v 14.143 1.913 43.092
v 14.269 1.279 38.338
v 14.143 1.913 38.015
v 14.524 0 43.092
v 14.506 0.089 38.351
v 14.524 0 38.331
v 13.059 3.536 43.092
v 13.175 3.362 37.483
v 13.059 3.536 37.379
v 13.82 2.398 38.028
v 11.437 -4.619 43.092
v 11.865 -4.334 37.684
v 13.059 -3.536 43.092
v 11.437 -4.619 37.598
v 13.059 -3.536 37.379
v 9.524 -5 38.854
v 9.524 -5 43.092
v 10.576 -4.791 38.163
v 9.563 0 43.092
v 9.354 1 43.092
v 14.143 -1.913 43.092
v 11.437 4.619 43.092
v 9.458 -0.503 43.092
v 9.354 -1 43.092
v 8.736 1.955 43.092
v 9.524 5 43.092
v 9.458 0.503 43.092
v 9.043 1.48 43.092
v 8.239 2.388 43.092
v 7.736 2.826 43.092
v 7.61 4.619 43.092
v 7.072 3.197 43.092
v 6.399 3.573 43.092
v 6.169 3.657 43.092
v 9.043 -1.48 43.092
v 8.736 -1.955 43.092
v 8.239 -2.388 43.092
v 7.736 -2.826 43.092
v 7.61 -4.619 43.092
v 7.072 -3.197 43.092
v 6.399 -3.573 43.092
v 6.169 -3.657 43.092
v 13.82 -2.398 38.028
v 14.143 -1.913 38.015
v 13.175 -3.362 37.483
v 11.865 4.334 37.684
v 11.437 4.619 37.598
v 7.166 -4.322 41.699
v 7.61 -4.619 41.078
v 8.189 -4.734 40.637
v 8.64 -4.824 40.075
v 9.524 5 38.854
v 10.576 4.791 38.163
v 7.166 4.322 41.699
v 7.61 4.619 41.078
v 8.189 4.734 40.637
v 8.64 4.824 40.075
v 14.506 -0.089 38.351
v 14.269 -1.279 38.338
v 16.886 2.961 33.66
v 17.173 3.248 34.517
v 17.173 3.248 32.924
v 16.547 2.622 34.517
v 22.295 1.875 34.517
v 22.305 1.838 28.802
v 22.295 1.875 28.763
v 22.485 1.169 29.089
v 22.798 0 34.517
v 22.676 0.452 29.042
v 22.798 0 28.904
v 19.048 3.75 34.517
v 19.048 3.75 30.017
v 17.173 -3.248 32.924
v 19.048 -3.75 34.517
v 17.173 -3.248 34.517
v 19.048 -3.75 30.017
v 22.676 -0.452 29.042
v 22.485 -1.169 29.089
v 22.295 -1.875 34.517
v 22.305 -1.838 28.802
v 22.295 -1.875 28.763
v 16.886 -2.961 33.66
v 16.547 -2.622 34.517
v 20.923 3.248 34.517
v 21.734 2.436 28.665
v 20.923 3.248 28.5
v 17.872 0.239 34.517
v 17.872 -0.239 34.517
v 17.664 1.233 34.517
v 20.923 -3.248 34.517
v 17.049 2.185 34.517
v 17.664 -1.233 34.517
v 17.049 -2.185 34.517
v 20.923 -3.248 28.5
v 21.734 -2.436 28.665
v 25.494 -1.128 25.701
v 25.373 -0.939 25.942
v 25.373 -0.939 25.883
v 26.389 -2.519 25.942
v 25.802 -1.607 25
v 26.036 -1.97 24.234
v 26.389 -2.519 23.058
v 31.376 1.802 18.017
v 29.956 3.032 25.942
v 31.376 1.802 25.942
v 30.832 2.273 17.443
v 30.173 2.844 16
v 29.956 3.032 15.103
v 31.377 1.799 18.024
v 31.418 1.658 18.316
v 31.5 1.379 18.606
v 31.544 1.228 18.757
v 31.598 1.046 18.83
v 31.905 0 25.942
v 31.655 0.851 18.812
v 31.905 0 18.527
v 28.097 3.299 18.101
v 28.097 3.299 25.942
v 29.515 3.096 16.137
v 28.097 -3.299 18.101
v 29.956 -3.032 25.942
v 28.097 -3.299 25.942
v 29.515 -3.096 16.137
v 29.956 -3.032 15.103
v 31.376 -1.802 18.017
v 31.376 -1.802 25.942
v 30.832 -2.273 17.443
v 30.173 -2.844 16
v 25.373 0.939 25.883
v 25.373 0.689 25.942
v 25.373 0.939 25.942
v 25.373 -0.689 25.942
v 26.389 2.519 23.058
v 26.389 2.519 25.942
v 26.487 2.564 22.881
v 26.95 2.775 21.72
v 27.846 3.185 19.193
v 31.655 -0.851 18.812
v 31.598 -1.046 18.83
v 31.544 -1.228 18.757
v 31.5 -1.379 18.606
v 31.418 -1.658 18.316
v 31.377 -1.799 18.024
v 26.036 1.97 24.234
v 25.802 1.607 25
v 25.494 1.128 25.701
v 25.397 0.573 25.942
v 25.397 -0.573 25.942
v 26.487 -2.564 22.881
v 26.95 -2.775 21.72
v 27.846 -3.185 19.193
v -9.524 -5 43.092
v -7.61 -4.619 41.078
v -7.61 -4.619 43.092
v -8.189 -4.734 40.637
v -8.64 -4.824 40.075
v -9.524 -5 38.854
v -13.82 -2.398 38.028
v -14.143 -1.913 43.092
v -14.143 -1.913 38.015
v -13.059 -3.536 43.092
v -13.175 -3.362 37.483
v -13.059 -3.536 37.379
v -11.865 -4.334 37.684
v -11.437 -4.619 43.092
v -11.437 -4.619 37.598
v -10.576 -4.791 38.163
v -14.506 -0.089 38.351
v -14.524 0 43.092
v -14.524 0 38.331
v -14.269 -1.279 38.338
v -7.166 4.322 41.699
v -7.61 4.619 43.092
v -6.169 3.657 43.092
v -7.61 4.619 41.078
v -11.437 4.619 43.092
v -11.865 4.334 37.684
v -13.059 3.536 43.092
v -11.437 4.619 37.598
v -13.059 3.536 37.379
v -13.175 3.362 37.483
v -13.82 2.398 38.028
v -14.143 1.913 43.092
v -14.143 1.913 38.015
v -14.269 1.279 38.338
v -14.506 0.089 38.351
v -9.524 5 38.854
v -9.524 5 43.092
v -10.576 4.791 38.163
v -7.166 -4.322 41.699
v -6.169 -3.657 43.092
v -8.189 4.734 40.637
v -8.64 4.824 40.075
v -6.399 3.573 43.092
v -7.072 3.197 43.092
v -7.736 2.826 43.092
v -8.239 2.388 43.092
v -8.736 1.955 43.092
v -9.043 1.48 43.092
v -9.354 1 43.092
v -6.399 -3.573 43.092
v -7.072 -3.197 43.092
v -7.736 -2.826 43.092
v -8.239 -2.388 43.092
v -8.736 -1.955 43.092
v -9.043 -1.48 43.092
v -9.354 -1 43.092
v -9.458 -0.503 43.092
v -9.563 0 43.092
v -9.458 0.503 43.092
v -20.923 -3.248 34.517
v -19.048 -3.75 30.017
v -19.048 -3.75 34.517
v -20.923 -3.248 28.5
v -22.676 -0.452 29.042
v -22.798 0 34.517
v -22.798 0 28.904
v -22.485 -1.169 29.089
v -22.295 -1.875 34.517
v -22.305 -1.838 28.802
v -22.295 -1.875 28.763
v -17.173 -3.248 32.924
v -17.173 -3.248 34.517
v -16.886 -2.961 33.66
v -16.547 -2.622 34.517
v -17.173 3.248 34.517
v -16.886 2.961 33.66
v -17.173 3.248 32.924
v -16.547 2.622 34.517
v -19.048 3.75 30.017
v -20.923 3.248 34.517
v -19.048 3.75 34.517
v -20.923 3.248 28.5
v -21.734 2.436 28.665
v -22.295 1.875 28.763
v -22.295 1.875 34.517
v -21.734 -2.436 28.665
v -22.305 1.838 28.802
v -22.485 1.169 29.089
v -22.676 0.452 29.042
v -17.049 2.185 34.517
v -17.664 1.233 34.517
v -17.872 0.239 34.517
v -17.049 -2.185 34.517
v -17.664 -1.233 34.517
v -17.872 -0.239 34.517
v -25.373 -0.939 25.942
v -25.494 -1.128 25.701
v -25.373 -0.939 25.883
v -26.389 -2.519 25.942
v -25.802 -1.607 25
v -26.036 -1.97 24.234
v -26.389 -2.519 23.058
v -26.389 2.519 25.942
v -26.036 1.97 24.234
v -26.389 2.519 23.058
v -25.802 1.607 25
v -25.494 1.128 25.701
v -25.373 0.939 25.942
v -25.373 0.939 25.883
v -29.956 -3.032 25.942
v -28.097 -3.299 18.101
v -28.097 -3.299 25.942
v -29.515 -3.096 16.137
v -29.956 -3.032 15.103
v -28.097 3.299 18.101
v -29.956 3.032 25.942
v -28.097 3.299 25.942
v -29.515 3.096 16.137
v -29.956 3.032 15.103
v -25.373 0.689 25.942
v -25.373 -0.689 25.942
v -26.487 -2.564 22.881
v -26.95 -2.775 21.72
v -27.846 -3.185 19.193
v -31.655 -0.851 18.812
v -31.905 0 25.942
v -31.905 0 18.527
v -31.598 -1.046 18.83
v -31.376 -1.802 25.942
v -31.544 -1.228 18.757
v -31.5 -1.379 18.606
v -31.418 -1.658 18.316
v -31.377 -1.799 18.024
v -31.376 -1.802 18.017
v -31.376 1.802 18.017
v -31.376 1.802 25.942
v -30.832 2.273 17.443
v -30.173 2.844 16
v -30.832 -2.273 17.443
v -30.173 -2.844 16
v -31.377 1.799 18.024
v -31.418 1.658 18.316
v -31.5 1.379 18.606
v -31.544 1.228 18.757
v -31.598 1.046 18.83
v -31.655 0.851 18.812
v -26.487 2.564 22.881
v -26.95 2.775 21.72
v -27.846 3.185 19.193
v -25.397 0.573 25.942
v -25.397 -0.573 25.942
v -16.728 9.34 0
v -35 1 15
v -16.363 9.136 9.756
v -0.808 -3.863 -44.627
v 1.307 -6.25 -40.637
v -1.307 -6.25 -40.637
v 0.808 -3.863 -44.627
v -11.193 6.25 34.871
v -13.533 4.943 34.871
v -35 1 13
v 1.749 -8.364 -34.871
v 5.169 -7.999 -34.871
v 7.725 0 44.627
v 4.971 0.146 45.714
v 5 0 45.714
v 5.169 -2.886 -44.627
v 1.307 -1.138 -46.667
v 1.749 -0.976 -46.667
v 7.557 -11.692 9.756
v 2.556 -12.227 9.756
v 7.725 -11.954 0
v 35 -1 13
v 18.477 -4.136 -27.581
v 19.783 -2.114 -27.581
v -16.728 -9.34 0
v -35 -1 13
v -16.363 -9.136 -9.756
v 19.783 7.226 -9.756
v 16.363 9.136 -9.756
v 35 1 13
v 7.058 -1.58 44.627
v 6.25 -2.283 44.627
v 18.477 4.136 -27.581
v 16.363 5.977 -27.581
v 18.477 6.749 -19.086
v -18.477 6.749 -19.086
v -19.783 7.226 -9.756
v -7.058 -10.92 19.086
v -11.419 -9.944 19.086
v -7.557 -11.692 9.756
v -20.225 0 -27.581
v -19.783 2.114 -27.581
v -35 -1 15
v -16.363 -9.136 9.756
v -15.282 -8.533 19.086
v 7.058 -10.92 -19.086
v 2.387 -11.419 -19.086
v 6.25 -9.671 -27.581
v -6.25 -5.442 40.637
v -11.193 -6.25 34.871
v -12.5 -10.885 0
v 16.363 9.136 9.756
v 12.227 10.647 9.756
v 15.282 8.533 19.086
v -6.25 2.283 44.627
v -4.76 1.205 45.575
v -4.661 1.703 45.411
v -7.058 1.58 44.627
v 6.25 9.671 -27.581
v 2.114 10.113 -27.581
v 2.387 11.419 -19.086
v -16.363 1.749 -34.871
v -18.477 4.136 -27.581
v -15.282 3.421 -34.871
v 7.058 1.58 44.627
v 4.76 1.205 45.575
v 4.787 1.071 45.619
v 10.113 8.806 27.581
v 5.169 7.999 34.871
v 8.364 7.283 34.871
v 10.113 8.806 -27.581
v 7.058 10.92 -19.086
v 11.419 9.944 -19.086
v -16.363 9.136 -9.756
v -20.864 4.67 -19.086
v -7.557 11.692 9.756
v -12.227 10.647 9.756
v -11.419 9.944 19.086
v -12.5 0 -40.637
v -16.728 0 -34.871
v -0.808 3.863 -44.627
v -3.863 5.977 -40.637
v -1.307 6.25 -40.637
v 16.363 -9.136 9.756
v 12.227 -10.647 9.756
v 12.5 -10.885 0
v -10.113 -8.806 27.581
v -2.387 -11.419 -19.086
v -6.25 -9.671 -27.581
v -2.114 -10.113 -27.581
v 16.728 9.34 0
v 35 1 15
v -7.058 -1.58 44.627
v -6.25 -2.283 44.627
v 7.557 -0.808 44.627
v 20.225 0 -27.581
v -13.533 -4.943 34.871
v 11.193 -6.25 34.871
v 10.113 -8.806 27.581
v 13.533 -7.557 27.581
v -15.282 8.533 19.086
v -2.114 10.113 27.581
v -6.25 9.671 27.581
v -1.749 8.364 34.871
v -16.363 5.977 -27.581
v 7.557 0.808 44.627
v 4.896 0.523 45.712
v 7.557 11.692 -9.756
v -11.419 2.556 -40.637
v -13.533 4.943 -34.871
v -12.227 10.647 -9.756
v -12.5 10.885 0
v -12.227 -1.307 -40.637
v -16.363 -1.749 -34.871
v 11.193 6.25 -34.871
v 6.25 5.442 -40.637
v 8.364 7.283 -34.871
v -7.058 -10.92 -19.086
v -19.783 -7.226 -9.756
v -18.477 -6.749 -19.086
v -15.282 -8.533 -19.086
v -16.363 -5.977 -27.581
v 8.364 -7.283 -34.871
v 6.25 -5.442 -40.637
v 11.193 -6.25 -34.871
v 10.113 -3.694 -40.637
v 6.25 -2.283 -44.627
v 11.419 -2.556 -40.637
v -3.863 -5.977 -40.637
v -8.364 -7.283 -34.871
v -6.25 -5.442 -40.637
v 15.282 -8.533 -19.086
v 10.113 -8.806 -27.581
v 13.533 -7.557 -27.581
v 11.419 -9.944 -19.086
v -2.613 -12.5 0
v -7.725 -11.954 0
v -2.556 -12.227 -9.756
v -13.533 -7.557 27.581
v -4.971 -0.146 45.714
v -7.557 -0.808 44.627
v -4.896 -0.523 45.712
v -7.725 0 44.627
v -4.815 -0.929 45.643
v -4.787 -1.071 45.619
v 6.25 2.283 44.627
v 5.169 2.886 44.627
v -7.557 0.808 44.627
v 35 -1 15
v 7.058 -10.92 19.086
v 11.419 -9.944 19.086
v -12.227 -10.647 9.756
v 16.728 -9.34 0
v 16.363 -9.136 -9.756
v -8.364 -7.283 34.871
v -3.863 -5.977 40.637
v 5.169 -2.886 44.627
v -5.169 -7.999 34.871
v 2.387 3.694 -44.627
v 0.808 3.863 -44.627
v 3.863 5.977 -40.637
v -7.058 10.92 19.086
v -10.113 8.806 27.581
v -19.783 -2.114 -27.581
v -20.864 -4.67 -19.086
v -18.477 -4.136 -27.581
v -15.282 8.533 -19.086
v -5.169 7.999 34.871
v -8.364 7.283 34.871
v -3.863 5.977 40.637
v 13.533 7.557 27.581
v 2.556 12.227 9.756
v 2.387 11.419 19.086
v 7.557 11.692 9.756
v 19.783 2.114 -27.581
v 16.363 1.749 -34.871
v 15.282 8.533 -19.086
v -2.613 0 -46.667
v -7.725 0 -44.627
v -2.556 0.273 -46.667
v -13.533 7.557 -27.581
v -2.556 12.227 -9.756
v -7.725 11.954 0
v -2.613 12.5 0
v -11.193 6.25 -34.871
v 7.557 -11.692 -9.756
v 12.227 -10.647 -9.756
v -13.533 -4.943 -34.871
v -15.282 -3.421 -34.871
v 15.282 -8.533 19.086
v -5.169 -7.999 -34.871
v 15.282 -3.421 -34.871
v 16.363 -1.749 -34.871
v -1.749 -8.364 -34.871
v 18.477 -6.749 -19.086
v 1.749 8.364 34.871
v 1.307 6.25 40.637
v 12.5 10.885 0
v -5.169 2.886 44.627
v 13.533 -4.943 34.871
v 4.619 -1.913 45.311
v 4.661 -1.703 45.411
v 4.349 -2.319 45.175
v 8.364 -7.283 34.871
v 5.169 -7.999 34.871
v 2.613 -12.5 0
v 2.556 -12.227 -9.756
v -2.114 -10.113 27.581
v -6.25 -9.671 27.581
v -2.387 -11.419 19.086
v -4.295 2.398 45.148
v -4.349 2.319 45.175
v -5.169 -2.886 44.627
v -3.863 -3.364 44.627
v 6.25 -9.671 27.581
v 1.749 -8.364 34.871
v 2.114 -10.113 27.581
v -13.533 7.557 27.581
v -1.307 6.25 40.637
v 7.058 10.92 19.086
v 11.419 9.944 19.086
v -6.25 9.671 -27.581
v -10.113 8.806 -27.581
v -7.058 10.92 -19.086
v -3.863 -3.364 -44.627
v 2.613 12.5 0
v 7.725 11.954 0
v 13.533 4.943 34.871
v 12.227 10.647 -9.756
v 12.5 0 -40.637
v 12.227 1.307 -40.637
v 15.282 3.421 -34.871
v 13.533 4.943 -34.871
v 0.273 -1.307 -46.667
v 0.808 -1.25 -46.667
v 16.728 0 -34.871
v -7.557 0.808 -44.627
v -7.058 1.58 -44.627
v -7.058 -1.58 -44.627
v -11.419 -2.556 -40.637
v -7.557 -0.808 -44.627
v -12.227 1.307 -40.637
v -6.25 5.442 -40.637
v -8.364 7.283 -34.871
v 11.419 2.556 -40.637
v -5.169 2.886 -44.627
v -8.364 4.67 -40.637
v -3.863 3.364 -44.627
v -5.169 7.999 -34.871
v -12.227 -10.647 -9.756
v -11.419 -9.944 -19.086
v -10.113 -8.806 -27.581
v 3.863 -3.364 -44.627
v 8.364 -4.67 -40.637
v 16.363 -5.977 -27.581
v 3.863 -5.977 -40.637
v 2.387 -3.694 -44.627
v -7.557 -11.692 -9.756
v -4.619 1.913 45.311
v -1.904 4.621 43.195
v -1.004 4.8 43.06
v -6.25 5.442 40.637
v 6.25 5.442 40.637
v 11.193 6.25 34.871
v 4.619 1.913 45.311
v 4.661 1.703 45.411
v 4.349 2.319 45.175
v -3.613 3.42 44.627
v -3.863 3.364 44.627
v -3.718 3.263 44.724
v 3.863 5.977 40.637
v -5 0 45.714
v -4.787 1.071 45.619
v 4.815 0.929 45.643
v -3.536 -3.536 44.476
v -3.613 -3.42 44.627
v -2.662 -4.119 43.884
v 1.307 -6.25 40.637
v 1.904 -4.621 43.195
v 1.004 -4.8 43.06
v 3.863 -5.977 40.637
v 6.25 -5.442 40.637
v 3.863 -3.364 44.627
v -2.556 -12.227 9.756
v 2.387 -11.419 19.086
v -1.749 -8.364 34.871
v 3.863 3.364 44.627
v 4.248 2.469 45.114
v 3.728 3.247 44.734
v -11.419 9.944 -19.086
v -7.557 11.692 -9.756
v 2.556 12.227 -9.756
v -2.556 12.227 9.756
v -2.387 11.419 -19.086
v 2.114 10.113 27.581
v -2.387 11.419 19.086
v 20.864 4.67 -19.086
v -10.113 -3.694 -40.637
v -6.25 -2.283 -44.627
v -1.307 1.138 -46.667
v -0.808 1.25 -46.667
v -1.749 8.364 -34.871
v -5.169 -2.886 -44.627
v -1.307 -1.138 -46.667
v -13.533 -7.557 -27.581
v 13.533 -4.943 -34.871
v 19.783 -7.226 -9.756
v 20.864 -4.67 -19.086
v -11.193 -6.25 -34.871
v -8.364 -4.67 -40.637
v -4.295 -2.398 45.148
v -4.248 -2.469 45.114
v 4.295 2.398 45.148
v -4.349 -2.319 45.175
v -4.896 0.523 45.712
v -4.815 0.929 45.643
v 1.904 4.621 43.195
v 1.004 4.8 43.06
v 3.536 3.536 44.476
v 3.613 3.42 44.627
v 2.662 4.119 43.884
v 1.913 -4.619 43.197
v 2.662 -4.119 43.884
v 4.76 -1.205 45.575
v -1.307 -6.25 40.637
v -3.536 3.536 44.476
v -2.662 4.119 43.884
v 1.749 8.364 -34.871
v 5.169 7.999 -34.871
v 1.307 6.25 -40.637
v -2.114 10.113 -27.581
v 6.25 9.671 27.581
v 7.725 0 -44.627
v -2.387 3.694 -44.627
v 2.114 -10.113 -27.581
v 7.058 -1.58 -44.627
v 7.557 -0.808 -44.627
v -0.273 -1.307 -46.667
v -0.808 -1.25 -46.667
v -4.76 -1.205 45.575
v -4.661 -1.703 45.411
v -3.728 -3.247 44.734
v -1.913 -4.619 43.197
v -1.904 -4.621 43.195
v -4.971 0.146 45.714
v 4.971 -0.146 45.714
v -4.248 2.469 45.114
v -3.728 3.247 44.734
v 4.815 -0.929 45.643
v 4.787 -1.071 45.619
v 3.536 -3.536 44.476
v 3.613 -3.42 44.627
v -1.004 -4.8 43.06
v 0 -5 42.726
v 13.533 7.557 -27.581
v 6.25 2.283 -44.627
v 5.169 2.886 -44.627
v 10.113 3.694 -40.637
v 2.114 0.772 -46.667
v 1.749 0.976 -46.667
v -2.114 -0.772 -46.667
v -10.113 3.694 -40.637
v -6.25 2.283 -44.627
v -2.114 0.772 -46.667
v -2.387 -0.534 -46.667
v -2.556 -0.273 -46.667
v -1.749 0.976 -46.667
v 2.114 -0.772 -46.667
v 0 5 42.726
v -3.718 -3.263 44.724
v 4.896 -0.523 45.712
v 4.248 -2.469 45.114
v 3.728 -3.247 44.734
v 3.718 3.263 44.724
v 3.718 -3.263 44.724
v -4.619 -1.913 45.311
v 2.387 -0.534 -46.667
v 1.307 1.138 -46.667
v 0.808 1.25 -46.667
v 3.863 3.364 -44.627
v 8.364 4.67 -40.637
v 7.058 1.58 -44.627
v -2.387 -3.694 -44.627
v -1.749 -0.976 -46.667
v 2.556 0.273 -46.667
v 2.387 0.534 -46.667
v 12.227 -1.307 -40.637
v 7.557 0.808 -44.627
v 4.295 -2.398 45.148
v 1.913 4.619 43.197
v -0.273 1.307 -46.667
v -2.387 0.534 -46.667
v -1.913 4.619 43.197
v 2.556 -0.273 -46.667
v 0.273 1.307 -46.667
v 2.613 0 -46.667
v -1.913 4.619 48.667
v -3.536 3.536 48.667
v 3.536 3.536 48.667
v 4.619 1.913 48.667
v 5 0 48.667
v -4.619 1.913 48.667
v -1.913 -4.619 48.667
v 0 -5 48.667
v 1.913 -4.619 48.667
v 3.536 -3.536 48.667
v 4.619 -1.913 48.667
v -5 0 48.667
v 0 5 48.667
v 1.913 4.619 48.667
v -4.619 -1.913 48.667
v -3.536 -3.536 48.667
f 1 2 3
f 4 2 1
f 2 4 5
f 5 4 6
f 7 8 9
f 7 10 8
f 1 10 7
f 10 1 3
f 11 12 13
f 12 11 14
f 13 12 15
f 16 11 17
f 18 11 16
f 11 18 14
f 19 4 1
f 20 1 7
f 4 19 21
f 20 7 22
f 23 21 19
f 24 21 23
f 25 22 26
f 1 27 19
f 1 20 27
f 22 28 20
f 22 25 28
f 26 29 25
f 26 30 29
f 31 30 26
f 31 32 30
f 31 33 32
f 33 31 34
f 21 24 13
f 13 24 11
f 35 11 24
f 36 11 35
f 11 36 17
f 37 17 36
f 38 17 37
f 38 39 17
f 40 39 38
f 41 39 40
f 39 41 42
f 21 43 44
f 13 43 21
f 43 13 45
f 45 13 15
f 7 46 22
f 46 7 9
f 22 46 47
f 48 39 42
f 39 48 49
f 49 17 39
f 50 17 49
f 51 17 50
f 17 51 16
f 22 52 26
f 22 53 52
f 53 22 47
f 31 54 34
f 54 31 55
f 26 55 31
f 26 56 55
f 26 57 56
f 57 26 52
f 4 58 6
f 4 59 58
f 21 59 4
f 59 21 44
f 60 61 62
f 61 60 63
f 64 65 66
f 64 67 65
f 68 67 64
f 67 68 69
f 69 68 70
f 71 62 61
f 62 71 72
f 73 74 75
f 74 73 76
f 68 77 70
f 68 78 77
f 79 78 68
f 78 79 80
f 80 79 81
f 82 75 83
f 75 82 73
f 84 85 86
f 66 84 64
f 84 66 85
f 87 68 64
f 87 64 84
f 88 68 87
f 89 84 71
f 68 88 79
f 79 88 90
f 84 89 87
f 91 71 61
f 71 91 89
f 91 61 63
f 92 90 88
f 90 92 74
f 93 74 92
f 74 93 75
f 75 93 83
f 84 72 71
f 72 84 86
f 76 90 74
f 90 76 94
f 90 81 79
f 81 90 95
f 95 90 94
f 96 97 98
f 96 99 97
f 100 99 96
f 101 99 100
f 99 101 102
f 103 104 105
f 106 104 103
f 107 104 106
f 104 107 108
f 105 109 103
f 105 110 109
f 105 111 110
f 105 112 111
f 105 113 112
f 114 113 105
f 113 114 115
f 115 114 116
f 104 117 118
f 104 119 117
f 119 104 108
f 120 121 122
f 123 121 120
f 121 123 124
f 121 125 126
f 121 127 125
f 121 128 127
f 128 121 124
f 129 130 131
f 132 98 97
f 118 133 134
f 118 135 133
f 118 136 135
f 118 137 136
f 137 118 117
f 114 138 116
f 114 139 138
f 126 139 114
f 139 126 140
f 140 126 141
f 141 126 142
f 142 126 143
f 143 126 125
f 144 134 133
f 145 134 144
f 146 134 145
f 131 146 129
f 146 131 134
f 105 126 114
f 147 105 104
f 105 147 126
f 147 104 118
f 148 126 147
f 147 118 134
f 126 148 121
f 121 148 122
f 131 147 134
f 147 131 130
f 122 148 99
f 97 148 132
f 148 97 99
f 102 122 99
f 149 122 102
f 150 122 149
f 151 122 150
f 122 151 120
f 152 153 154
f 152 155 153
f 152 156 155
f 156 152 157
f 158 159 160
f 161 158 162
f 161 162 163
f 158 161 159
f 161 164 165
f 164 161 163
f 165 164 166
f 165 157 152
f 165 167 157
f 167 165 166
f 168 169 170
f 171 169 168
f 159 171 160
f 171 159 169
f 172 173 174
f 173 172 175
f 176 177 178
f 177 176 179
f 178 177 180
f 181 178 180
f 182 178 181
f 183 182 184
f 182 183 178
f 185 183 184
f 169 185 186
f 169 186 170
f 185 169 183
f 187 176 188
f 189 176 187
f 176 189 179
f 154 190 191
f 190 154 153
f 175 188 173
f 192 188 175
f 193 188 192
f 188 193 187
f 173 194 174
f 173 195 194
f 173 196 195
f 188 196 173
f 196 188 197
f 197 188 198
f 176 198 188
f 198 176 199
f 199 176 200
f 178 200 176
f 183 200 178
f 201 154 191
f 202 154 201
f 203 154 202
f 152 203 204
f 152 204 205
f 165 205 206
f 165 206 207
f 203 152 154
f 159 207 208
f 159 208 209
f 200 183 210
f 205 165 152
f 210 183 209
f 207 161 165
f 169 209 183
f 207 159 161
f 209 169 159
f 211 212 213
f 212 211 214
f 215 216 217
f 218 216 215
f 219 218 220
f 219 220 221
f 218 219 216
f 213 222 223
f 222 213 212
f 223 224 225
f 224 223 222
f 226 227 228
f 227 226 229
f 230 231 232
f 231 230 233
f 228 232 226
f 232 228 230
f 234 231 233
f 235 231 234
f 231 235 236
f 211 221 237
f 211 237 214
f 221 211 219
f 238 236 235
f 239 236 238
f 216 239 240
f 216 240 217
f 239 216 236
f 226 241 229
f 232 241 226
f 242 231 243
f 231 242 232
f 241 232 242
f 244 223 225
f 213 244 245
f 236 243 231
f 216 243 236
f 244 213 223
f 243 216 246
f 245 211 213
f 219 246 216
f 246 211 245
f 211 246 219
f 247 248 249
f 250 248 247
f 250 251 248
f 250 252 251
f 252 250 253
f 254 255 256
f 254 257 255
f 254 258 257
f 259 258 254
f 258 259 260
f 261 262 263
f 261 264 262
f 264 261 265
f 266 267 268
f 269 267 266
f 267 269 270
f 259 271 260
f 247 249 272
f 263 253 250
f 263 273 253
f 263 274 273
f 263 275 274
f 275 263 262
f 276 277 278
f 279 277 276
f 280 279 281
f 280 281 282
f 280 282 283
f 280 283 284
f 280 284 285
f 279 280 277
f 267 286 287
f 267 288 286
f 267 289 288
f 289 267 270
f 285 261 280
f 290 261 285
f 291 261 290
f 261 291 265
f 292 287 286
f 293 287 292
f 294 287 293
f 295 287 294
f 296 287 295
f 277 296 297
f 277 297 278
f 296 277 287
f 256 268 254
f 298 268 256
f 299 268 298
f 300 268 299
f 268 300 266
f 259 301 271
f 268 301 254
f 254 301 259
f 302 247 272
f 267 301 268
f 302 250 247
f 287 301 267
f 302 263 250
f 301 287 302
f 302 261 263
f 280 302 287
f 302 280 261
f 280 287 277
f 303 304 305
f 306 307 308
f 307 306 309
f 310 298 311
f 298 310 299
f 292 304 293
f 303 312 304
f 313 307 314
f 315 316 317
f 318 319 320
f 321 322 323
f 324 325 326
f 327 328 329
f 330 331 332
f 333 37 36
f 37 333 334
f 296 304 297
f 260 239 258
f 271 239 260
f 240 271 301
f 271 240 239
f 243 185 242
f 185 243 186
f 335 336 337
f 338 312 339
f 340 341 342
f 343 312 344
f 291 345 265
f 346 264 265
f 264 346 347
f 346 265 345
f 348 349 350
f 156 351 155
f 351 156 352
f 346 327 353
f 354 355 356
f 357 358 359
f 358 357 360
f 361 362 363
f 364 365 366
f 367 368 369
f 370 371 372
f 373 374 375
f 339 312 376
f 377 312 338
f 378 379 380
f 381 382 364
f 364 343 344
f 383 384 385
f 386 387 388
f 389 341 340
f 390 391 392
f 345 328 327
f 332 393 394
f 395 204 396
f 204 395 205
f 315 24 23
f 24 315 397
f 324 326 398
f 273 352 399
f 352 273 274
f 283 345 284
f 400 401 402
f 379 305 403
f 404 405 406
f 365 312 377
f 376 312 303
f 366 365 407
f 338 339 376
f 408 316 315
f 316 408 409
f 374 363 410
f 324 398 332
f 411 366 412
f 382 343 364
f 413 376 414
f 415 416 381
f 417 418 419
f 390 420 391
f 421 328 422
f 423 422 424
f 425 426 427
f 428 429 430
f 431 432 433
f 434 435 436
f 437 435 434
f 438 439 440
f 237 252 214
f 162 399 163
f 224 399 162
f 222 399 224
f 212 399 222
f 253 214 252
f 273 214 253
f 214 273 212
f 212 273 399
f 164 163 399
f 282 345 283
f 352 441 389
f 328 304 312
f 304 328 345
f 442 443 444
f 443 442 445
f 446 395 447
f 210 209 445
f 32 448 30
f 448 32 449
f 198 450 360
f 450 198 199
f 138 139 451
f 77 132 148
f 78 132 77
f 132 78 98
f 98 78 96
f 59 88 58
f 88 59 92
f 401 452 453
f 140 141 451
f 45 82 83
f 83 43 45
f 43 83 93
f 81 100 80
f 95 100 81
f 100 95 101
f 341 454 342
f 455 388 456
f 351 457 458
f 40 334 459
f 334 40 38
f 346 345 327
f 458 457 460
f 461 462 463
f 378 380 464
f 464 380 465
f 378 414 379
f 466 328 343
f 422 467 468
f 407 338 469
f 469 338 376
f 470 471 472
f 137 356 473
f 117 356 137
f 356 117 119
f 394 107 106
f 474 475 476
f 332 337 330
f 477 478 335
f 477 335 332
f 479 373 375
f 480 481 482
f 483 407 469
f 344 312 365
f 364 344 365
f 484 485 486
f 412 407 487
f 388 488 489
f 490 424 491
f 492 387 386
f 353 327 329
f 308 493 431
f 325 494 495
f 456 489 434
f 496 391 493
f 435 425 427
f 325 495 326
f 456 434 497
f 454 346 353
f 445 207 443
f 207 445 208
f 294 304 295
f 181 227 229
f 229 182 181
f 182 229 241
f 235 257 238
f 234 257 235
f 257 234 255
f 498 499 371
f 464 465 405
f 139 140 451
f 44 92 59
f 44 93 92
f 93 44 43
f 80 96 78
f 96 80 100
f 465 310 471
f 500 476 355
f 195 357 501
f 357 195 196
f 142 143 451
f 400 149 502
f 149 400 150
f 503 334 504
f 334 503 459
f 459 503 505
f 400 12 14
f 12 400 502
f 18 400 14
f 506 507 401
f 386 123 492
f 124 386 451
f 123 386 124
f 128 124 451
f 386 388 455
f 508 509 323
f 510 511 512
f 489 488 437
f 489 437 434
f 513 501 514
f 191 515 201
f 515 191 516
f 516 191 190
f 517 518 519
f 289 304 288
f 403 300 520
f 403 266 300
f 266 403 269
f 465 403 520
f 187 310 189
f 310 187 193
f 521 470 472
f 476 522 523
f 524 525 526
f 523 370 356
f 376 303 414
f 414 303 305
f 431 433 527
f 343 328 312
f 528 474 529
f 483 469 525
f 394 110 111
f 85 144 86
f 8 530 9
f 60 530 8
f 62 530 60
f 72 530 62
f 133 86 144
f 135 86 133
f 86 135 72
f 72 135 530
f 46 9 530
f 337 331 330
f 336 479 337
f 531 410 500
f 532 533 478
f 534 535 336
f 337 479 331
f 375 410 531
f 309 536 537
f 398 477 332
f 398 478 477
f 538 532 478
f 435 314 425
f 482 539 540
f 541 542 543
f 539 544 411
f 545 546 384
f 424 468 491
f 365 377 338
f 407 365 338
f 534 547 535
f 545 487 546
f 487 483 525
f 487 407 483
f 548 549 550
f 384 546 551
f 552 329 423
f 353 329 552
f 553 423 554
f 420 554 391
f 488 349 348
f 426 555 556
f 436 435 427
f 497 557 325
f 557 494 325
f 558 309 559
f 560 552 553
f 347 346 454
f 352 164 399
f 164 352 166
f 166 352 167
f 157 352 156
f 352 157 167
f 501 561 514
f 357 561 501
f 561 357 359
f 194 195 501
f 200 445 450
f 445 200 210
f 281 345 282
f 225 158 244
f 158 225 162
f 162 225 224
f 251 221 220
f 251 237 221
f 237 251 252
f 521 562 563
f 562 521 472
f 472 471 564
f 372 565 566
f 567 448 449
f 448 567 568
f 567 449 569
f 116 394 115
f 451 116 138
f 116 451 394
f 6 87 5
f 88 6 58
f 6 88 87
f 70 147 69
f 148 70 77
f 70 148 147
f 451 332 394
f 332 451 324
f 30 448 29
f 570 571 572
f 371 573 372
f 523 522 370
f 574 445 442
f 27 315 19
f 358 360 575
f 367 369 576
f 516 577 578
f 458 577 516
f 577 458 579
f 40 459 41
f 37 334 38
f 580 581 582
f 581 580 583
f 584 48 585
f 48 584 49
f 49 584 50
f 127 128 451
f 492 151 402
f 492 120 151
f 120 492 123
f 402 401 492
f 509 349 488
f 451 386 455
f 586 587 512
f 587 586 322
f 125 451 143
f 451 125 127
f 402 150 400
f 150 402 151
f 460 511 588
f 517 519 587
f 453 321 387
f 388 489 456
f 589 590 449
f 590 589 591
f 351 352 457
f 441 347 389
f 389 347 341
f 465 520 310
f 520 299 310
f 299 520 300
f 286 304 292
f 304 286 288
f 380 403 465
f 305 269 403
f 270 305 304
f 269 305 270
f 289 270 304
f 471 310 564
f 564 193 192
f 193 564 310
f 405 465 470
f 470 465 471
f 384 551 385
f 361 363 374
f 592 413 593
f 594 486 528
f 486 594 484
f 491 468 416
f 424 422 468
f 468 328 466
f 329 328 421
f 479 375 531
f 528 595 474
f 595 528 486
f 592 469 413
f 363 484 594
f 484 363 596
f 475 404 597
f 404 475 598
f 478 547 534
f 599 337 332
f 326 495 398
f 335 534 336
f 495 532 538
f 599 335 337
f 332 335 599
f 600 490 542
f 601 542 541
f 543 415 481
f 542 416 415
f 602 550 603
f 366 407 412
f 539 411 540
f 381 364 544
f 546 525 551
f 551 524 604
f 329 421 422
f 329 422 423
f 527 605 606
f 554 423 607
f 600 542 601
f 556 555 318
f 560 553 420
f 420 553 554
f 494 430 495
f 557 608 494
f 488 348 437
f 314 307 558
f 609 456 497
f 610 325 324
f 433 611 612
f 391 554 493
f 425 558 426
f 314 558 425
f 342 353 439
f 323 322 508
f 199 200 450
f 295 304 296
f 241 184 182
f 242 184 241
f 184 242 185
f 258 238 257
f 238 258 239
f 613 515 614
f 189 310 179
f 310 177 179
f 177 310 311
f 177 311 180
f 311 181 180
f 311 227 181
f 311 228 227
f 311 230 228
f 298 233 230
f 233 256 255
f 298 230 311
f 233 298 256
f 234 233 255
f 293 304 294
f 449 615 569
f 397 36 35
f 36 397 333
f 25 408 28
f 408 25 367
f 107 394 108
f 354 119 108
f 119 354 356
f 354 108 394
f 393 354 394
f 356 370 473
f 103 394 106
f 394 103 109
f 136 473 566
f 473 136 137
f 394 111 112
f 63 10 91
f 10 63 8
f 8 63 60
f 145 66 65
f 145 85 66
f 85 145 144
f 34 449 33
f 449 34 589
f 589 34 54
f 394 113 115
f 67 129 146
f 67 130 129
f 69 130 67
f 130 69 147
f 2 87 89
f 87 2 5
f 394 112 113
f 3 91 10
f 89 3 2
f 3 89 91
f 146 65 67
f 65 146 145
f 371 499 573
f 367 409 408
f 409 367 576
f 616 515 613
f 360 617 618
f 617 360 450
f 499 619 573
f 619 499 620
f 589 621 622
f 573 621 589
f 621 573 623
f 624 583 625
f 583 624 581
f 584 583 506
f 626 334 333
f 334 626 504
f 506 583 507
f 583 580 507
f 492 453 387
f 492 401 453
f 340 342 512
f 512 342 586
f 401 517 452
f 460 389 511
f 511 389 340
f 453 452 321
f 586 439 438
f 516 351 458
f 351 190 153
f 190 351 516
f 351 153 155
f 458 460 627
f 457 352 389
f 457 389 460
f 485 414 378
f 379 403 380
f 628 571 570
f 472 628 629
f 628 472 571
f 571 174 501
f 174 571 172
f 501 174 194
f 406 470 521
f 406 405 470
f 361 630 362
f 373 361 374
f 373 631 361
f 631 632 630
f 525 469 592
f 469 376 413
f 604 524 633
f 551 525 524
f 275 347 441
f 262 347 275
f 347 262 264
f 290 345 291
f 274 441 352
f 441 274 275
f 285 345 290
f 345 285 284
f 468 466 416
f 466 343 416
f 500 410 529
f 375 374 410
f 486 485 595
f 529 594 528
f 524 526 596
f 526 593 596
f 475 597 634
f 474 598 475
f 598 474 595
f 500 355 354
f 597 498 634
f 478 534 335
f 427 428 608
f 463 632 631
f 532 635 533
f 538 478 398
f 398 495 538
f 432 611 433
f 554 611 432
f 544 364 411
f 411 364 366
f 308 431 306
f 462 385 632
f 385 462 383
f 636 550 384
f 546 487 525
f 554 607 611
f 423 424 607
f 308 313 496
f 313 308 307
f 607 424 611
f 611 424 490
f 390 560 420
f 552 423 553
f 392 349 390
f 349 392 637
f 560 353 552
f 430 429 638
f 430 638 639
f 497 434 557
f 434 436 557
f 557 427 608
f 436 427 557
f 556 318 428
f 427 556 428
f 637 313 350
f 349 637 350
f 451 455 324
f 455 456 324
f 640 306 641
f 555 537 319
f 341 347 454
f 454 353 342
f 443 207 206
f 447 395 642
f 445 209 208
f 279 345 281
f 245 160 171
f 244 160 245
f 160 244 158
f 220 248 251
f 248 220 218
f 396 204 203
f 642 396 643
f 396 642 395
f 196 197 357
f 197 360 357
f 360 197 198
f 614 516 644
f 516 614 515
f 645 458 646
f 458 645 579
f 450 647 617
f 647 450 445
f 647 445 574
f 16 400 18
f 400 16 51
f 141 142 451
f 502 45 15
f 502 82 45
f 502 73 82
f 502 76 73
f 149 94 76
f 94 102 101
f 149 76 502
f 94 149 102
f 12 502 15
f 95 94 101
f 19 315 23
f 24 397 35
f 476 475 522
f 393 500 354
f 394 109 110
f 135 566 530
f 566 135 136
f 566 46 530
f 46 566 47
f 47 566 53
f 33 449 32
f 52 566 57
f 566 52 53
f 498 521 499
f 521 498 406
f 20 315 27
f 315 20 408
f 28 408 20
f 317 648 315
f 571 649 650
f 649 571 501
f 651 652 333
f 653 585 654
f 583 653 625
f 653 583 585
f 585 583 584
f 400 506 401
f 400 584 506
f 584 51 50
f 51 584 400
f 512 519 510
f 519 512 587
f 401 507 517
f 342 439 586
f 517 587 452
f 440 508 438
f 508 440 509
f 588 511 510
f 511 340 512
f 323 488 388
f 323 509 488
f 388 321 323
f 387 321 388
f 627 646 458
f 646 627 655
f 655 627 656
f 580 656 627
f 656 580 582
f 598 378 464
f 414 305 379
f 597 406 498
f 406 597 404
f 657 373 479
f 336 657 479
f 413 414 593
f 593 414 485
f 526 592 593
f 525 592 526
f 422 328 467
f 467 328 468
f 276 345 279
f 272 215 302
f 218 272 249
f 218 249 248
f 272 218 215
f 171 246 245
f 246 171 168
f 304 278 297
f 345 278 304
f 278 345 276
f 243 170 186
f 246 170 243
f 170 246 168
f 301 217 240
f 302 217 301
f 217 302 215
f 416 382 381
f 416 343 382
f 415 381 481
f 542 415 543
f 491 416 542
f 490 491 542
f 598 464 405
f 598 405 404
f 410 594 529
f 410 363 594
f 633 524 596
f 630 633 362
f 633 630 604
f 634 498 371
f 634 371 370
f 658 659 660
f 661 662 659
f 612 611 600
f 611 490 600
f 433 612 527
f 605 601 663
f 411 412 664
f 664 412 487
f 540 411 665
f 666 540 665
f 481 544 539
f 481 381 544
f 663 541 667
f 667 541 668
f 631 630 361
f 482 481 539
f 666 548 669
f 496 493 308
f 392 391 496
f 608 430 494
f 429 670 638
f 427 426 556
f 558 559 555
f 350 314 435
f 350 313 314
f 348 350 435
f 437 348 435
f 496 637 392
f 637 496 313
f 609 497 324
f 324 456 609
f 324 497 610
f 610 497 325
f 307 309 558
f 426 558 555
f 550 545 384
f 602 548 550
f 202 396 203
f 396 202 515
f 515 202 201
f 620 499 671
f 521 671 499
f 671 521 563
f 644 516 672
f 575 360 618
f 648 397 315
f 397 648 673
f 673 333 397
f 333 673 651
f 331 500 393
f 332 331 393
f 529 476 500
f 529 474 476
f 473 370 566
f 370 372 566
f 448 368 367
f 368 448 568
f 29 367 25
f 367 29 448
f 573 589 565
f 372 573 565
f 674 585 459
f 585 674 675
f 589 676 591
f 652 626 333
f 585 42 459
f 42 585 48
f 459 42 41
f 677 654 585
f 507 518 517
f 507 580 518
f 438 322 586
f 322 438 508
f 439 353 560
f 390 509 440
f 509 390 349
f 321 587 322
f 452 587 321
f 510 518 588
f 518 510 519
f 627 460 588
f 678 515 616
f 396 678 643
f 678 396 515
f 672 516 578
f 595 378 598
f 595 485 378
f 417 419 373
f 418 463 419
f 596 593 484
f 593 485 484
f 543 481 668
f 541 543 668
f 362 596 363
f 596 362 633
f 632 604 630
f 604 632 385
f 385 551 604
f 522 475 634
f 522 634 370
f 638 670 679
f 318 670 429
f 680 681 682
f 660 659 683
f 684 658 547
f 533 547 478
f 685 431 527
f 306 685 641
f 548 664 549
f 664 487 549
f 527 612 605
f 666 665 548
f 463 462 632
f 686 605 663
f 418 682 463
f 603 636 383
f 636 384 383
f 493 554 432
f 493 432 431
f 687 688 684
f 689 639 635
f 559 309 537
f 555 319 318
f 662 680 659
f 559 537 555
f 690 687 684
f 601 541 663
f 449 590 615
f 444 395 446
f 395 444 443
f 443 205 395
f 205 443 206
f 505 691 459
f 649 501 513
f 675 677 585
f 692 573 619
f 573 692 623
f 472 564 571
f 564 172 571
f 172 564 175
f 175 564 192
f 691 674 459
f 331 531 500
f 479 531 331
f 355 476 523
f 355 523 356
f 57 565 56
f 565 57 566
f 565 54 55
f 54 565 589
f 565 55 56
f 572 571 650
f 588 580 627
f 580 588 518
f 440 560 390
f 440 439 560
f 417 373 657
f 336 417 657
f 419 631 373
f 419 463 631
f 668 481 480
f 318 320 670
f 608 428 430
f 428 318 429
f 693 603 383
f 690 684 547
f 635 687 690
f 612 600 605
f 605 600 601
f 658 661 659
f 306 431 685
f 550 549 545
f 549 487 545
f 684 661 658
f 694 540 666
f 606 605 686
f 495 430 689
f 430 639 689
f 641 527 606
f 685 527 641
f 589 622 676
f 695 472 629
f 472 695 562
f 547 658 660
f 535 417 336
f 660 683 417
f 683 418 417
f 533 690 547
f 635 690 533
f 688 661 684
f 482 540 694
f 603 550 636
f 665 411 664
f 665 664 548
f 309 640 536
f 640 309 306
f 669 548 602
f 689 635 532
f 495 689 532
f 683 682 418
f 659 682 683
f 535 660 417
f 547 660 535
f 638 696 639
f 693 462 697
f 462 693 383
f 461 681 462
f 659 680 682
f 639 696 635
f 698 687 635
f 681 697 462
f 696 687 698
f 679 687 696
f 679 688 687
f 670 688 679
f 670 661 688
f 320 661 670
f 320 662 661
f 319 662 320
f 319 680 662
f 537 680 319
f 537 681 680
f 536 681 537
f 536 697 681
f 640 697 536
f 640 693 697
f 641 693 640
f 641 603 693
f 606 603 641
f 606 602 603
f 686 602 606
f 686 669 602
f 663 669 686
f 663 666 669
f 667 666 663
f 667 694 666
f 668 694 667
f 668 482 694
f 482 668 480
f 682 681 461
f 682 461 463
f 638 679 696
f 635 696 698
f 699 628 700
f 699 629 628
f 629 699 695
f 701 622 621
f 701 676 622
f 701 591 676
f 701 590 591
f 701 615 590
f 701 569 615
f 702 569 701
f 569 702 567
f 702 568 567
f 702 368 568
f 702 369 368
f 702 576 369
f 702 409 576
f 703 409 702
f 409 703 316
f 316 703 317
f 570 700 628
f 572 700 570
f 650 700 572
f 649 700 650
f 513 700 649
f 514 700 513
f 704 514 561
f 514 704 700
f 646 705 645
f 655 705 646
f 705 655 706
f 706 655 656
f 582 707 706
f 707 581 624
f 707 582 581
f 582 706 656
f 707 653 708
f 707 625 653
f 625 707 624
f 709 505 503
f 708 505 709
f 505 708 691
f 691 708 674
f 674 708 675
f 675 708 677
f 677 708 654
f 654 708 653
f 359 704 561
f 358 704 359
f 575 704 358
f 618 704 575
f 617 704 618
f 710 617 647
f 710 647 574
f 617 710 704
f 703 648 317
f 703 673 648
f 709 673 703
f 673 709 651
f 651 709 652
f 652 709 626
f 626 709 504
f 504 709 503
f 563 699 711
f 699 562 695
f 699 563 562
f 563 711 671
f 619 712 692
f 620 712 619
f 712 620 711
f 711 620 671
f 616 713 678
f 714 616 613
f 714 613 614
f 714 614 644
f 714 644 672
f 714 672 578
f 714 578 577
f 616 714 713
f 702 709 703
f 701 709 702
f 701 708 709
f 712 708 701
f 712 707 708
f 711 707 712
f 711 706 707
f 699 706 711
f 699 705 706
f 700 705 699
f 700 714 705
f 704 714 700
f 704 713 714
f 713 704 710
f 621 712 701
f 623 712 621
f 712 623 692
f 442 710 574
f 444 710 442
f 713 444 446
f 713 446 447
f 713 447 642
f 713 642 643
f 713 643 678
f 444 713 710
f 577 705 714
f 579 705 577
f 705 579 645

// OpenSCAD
/*
p = number of pylons
r = main body radius
l = length
a = wing/pylon sweep 0-40 deg
*/
module radialType(p, r, l, a) {
	//body
	hull() {
		sphere(r);
		translate([0, 0, l-1.5*r]) sphere(r/2);
	}
	//pylons
	for (i=[0:p]) {
		rotate([0, -a, i*(360/p)]) translate([(r/2)-1, 0, l/3]) enginePylon(a, 30);
	}
}

module enginePylon(a, l) {
	//translate([0, -2, 0]) cube([l, 4, 8], false);
	resize(newsize=[l, 4, 8]) rotate([0, 90, 0]) cylinder(l, 4, 4,false);
	rotate([0, a, 0]) translate([l-1, 0, a/2]) cylinder(20, 8, 8, true);
}

module engine(r) {
	cylinder(20, r, r, true);
}

deltaType(70, 25, .75, .65, 7);
/*
s= span
t= thickness
a= aspect ratio (0<x)
sw= wing sweep (0-1)
e= number of engines
*/
module deltaType(s, t, a, sw, e) {
	//body
	l = s/a;
	hull() {
		resize(newsize=[0, t, l]) sphere(t);
		//"wings"
		translate([0, 0, l*(sw-.5)]) cube([s, 2, 2], true);
	}
	//engines
	r = s/(2*e);
	if (floor(e/2) != ceil(e/2)) translate([0, 0, -8+l/2]) engine(r);
	for (i=[0:1]) {
		for (k=[1:1:(e/2)]) {
			rotate([0, 0, i*(180)]) 
				translate([k*s/(1.05*e), 0, (-5+l/2)-(k/(e+1))*2.1*(1-sw)*l]) 
					engine((k+1)*r/(2*k));
		}
	}
}

module displayShips(s, sp) {
// display code
for (i=[0.9:0.16:2]) {
	for (k=[0.25:0.15:0.75]) {
		for (j=[1:1:7]) {
			translate([sp*(i-0.9)*10*s, (sp*j)*s, -sp*(0.25-k)*10*s]) deltaType(s, s/4, i, k, j);
		}
	}
}

for (i=[5:5:35]) {
	for (k=[10:5:25]) {
		for (j=[2:7]) {
			translate([sp*(i-5)*30, -sp*(j-1)*150, -sp*(10-k)*30]) radialType(j, k, s, i);
		}
	}
}
}

//sdisplayShips(100, 2);
